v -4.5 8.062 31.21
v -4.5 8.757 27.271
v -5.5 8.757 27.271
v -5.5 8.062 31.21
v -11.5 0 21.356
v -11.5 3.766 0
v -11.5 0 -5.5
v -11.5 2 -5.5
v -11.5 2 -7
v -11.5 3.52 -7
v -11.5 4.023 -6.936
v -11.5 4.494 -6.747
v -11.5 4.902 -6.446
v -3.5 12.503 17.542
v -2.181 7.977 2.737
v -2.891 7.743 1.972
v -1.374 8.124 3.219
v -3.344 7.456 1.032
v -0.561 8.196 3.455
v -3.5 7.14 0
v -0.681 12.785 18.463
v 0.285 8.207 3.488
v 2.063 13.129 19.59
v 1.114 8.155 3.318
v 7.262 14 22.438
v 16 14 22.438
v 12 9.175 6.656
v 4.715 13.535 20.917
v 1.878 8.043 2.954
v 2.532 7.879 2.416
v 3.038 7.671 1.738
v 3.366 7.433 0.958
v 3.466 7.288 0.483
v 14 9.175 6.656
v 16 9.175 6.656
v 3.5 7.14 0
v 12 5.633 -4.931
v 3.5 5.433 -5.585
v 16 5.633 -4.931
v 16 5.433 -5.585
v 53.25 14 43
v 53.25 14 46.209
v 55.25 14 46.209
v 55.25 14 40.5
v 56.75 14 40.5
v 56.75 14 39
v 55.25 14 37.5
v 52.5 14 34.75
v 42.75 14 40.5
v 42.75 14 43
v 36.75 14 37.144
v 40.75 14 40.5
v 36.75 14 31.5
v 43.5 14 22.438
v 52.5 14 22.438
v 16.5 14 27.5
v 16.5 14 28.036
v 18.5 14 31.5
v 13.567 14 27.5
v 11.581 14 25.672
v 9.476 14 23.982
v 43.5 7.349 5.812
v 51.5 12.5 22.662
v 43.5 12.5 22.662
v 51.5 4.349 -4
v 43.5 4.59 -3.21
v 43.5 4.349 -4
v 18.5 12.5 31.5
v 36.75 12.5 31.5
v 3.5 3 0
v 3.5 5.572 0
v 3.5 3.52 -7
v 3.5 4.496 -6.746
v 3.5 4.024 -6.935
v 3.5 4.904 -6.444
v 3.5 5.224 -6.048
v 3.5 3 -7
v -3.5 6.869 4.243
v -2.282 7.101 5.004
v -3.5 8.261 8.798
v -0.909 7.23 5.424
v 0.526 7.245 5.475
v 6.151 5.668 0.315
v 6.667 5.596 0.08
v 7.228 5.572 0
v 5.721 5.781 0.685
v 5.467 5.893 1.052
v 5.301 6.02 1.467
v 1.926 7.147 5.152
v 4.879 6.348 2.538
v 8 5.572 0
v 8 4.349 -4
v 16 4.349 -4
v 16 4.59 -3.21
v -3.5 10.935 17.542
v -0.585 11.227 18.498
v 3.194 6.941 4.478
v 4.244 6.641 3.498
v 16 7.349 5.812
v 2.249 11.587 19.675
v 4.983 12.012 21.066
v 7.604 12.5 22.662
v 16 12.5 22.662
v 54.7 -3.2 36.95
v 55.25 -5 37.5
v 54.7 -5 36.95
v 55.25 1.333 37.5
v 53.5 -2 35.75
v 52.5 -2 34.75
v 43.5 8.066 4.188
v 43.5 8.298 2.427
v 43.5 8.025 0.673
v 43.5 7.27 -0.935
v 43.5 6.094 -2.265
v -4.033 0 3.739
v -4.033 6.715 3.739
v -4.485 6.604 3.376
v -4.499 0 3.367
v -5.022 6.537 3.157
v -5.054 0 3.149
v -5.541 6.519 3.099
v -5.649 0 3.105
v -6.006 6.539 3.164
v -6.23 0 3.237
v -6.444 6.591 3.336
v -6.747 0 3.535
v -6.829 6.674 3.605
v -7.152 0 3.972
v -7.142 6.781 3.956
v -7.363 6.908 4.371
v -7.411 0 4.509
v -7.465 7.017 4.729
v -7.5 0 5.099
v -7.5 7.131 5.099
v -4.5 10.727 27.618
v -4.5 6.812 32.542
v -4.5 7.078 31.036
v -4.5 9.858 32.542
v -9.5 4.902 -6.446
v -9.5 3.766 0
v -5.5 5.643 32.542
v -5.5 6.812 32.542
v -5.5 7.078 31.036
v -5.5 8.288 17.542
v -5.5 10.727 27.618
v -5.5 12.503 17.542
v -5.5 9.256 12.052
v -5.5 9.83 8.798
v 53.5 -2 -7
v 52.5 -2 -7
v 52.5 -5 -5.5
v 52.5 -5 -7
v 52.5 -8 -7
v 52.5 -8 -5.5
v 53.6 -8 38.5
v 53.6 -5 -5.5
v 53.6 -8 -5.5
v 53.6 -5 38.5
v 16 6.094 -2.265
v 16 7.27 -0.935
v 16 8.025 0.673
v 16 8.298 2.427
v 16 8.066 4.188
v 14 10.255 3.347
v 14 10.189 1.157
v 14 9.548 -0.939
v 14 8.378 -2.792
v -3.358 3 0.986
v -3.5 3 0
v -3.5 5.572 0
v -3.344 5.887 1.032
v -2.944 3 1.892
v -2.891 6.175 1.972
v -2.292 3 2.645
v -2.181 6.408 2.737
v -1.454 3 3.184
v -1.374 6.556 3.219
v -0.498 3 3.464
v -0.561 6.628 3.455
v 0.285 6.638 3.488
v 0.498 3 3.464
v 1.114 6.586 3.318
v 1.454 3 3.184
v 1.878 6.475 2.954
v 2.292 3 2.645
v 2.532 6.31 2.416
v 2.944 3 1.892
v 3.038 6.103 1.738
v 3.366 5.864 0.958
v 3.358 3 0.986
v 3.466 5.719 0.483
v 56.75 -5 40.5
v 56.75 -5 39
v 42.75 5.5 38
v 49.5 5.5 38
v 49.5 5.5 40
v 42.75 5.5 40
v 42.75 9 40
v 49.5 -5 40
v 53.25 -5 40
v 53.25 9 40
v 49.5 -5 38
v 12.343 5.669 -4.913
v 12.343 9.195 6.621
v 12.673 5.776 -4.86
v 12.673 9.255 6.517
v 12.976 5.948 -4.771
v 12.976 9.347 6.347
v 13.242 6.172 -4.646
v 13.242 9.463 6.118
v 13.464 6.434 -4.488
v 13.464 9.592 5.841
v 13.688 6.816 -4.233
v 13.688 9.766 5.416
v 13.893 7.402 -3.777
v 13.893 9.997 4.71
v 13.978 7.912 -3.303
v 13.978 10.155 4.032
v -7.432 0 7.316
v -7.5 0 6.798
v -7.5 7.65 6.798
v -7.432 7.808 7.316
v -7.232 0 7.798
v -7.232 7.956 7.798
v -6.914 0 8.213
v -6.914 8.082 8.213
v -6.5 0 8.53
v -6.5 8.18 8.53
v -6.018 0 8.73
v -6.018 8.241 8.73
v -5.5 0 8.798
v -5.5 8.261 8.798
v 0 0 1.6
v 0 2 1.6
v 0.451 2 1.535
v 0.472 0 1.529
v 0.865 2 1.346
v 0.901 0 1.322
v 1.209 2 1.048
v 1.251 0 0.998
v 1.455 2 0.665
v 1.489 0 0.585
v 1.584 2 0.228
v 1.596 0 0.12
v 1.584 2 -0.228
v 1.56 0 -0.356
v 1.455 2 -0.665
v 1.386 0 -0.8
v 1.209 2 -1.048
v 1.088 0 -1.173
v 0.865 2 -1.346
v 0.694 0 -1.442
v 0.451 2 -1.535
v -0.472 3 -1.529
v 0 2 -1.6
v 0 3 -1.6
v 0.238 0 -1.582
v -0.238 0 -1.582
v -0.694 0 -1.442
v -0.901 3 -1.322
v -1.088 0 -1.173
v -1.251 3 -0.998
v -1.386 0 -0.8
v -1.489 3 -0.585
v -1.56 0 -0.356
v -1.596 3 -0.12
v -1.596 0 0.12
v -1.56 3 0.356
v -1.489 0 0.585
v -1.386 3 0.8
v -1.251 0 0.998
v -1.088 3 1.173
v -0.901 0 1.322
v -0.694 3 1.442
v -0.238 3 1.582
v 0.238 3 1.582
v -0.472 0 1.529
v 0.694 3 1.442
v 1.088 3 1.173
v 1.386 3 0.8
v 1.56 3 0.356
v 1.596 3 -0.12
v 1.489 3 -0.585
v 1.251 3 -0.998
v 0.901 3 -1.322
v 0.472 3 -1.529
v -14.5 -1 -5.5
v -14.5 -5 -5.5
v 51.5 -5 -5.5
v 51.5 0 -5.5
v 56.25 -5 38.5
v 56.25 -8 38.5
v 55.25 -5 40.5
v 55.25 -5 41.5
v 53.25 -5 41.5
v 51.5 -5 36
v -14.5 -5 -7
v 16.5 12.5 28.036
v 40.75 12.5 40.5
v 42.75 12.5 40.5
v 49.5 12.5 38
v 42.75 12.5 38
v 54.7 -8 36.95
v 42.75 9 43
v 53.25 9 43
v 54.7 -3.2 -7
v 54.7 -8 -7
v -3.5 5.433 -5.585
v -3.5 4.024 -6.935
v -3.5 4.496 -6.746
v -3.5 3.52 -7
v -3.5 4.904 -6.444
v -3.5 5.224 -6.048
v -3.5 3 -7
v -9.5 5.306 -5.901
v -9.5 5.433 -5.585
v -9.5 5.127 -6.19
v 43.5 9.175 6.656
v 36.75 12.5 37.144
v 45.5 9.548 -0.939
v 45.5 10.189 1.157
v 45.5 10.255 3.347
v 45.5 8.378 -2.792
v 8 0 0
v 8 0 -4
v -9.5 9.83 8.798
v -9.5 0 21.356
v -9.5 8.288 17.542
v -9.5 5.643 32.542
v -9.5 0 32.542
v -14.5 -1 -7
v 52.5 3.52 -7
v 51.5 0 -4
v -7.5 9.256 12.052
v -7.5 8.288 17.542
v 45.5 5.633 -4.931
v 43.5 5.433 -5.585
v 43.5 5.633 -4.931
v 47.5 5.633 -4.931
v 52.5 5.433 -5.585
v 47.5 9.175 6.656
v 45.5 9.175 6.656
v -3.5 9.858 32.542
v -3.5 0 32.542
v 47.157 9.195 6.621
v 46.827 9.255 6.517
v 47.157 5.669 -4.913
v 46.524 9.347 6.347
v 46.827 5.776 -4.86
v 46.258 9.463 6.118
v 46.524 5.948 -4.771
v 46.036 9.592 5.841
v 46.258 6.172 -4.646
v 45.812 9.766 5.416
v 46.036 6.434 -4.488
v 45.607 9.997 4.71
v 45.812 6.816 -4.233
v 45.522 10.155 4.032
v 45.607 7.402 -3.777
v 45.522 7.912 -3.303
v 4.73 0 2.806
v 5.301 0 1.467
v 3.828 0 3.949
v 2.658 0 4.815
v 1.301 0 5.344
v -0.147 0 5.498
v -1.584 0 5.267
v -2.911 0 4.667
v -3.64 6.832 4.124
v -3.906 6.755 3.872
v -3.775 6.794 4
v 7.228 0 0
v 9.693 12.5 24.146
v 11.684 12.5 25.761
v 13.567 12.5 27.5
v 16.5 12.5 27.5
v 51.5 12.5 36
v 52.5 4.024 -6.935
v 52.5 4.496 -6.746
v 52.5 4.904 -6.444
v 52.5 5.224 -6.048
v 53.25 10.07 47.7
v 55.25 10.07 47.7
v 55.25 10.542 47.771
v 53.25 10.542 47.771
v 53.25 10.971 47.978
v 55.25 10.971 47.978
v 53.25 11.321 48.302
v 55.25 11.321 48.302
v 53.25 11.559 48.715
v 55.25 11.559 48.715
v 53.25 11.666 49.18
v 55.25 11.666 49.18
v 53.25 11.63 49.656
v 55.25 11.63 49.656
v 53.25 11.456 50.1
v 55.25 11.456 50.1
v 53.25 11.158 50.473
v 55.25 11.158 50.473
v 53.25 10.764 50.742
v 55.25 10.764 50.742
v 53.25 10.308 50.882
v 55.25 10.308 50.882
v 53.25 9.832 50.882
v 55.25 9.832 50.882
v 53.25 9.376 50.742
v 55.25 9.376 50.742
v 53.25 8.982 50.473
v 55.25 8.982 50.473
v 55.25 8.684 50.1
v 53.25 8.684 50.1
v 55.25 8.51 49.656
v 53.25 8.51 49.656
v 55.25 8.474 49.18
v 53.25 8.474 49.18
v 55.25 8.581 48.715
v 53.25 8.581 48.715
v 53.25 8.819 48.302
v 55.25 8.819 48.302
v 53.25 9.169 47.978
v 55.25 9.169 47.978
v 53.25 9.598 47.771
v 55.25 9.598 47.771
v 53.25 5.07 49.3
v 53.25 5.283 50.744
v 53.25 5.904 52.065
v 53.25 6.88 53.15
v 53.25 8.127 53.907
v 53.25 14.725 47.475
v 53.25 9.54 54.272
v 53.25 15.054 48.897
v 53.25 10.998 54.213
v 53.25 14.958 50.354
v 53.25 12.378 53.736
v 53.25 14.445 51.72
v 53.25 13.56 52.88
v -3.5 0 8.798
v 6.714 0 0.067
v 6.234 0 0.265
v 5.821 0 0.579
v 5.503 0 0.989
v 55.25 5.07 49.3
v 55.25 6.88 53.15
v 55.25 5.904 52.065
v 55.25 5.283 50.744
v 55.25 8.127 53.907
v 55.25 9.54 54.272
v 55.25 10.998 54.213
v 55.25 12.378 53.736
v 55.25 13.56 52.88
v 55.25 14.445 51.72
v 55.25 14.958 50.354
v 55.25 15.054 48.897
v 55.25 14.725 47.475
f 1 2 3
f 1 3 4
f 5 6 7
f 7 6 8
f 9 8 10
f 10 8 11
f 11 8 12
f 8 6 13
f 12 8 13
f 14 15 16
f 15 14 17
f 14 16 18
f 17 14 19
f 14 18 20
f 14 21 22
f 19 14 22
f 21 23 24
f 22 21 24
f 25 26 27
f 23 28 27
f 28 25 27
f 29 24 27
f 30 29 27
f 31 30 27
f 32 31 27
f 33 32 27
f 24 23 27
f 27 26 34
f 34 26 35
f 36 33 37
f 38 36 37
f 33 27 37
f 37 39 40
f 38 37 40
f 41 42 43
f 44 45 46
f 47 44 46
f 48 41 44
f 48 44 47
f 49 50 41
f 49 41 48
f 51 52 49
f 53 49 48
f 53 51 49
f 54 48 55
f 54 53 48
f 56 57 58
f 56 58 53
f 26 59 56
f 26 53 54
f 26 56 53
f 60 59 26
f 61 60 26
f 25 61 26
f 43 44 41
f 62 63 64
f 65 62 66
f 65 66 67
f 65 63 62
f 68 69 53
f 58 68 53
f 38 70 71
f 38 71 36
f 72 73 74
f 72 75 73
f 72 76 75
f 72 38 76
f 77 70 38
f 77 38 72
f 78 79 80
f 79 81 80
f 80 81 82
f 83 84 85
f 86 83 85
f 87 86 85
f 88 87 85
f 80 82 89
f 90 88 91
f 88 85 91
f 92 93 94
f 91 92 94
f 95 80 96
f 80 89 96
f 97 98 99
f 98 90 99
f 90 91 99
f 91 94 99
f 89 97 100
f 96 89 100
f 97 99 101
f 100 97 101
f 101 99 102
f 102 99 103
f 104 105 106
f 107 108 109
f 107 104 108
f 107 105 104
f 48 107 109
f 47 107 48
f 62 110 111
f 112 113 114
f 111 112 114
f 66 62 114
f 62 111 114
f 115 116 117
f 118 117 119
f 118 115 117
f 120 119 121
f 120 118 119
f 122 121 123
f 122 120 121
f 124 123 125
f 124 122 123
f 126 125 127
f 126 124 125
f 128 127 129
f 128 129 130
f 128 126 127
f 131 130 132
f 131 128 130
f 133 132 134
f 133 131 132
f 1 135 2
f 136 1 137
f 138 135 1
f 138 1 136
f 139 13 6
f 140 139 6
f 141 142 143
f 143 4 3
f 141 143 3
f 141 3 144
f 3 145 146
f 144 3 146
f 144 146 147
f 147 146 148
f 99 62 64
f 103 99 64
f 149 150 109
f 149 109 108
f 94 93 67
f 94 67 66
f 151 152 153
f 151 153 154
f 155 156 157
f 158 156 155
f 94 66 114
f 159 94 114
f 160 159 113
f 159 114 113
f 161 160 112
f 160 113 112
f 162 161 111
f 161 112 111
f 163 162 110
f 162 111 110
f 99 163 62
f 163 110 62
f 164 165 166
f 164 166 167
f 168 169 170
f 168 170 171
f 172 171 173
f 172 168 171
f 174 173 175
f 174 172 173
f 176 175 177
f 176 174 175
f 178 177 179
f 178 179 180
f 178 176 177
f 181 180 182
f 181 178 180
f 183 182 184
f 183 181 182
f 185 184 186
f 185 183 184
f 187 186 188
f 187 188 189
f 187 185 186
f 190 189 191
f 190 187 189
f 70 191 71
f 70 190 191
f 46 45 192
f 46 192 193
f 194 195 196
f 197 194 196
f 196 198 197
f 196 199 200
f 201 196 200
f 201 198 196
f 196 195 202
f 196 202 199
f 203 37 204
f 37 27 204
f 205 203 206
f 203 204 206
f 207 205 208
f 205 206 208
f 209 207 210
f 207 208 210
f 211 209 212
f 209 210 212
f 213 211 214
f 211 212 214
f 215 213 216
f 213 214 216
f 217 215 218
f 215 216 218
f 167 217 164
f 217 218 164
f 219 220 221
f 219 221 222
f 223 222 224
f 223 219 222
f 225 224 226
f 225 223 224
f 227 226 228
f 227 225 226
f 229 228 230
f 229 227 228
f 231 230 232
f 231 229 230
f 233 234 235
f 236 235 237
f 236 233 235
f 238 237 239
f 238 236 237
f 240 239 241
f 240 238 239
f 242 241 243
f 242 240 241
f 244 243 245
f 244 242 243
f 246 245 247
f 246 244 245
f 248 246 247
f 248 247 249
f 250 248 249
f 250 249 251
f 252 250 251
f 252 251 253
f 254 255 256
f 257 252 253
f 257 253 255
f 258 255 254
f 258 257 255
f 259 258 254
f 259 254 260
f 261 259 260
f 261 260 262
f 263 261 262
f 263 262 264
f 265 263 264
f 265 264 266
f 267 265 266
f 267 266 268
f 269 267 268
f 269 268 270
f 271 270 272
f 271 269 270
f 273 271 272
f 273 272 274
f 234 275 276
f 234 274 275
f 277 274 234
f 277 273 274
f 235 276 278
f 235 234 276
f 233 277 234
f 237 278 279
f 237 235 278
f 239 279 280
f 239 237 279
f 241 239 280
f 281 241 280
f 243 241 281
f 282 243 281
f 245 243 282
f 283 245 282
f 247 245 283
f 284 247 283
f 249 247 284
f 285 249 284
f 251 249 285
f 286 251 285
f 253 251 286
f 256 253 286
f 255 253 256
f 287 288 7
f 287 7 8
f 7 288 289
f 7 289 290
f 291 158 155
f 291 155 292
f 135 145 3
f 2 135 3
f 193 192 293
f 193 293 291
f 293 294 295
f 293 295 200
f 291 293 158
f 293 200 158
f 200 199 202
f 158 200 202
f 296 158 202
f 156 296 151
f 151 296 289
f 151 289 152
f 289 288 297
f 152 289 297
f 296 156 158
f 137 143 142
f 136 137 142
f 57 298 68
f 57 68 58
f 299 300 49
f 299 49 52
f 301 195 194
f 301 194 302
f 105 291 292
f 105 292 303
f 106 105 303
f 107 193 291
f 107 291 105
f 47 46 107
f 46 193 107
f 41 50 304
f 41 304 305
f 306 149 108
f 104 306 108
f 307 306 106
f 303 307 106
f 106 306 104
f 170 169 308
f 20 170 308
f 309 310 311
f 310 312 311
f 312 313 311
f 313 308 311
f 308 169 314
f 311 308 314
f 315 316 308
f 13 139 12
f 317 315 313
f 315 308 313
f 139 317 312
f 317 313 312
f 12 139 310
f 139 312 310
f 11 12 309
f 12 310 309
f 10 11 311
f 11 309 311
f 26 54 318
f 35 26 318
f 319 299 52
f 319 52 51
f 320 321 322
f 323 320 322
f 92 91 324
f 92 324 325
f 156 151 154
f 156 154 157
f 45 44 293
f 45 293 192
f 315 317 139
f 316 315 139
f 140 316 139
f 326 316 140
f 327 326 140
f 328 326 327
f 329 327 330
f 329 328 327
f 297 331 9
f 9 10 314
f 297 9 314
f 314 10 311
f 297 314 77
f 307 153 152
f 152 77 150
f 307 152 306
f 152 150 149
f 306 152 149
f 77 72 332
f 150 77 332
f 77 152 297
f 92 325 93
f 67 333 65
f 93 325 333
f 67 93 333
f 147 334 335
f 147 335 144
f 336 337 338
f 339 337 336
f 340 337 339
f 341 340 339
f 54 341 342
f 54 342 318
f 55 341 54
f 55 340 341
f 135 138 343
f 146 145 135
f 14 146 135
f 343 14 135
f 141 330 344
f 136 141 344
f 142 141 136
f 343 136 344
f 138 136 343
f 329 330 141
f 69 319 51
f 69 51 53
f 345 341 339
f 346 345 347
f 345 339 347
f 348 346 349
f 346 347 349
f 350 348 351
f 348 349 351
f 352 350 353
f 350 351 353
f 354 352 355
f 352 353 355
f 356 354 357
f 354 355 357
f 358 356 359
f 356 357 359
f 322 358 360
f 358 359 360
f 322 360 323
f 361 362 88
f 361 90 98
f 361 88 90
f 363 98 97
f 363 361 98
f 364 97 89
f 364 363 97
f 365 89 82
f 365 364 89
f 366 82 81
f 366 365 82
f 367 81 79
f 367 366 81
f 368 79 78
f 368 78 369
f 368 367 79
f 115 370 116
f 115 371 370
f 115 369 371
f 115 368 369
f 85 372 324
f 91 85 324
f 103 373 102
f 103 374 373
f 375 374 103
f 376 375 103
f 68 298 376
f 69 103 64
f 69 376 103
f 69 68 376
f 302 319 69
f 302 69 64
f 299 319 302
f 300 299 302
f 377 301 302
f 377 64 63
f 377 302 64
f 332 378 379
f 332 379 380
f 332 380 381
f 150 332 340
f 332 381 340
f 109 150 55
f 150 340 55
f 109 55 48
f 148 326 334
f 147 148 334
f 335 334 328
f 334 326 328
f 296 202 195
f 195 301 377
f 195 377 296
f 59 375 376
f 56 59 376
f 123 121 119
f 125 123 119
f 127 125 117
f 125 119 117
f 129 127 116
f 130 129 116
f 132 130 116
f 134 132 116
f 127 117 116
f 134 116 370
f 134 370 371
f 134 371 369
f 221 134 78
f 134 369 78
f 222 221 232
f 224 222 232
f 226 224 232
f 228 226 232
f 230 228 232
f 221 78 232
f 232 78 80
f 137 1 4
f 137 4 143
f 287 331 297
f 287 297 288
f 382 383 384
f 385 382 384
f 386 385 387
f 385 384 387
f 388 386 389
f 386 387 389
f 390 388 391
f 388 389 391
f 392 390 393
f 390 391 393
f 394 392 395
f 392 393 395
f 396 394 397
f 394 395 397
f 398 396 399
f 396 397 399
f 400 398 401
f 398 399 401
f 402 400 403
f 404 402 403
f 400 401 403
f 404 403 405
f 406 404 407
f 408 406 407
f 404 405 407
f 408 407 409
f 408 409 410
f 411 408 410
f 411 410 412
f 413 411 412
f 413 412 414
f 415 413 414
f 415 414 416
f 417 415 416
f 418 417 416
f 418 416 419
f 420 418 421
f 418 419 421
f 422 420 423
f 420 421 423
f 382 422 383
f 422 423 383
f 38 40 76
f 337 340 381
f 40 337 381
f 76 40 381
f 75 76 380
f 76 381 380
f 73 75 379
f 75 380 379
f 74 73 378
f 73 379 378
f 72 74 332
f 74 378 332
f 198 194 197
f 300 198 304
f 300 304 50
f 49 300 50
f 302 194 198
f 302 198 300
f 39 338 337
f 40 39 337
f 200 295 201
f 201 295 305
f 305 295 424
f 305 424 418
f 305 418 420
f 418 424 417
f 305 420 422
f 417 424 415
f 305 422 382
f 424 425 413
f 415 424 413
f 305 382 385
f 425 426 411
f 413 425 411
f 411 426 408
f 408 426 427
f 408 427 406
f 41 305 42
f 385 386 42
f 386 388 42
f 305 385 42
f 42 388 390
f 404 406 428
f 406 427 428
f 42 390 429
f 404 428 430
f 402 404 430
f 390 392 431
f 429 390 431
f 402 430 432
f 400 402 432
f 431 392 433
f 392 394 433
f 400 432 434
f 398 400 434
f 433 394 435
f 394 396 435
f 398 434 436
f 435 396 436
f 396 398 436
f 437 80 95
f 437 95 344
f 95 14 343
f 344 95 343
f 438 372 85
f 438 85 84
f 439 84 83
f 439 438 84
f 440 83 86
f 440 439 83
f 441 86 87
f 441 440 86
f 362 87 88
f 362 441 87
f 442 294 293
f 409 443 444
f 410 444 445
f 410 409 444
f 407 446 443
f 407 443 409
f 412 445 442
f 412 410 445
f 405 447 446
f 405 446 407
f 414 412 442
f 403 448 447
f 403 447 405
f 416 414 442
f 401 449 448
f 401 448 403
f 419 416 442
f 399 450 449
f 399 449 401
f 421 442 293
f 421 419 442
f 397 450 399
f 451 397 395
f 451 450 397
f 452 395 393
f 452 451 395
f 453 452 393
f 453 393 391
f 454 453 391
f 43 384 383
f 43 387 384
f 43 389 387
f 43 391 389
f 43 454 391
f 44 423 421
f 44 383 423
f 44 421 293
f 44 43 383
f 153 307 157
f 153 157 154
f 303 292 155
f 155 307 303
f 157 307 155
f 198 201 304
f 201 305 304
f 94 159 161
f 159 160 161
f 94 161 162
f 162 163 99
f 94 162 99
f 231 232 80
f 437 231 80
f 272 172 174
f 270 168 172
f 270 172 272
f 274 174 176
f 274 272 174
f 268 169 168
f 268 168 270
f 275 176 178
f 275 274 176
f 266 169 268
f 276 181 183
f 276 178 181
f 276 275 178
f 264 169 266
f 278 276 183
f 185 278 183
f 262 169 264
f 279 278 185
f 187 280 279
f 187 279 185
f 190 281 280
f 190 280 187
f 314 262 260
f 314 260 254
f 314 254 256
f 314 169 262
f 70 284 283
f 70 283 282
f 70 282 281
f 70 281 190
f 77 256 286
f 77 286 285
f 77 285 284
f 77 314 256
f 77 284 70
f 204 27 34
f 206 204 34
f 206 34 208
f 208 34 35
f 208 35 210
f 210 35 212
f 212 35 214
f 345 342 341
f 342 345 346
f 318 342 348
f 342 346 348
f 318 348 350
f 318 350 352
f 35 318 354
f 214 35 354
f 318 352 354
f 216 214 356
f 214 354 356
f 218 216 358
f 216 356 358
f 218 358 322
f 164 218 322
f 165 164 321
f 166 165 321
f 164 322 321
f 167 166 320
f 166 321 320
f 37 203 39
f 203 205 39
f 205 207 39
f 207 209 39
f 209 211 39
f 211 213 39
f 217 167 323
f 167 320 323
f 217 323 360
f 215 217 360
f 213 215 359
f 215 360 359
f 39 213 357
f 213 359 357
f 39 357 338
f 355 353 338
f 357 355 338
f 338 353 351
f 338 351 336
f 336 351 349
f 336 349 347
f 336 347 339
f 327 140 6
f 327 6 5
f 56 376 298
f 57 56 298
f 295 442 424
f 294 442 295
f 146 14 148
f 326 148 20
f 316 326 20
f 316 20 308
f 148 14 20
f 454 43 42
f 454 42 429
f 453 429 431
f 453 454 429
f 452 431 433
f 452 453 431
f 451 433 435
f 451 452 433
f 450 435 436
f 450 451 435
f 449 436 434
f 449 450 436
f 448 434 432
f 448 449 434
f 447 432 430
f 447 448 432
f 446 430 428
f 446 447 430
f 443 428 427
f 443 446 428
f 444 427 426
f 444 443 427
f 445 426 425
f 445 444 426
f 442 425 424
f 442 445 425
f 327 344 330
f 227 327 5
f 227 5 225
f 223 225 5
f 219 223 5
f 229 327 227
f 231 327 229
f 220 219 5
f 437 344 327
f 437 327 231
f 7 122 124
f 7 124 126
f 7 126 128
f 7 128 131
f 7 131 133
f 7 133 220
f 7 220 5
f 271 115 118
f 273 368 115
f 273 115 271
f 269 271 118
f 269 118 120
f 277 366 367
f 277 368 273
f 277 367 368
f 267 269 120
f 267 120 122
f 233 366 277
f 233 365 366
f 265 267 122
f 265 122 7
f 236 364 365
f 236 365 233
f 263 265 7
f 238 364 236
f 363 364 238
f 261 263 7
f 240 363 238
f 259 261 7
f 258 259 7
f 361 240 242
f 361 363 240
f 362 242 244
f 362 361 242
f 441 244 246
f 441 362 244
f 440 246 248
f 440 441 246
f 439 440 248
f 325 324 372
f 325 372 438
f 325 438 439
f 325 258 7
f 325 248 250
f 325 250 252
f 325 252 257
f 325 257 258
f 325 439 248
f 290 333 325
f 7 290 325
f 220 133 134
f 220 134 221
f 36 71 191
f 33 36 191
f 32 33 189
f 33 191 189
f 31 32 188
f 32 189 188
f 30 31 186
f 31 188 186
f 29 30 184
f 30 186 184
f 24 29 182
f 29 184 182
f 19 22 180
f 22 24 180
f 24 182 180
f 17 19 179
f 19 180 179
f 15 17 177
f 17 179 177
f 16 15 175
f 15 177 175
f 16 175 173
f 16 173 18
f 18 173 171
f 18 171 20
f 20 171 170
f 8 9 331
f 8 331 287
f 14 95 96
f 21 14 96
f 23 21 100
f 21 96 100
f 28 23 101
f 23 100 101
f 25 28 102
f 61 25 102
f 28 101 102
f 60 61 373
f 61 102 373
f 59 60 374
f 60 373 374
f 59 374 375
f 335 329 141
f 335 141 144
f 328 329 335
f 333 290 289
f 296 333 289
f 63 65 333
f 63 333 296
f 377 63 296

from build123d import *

# Parameters (mm, degrees)
SKETCH_1_R                      = 3.5
SKETCH_1_R_2                    = 1.6
EXTRUDE_1_DEPTH                 = 2
EXTRUDE_2_DEPTH                 = 2
SKETCH_3_W                      = 7
SKETCH_3_H                      = 1.5
EXTRUDE_3_DEPTH                 = 5
EXTRUDE_4_DEPTH                 = 49
CUT_EXTRUDE_1_REACH             = 55.2
SKETCH_5_W                      = 44.5
SKETCH_5_H                      = 4
SKETCH_6_W                      = 1
SKETCH_6_H                      = 7
EXTRUDE_5_DEPTH                 = 47
EXTRUDE_6_DEPTH                 = 1
EXTRUDE_7_DEPTH                 = 8
EXTRUDE_8_DEPTH                 = 27.5
EXTRUDE_START                   = 2
EXTRUDE_9_DEPTH                 = 2
CUT_EXTRUDE_2_REACH             = 71.172
SKETCH_11_W                     = 26.75
SKETCH_11_H                     = 10
EXTRUDE_10_DEPTH                = 19.5
EXTRUDE_11_DEPTH                = 2
EXTRUDE_12_REACH                = 69.989
CUT_EXTRUDE_3_REACH             = 69.989
SKETCH_15_R                     = 1.6
CUT_EXTRUDE_4_REACH             = 71.172
SKETCH_16_W                     = 20
SKETCH_16_H                     = 4
CUT_EXTRUDE_5_REACH             = 71.172
CUT_EXTRUDE_5_DIRECTION_2_REACH = 71.172
CHAMFER_1_SIZE                  = 2
CHAMFER_1_SIZE2                 = 3.464101615
EXTRUDE_13_DEPTH                = 1.5
SKETCH_19_W                     = 3.5
SKETCH_19_H                     = 17.5
EXTRUDE_14_DEPTH                = 2
SKETCH_20_W                     = 3.5
SKETCH_20_H                     = 7
EXTRUDE_15_DEPTH                = 6.75
EXTRUDE_16_DEPTH                = 8
SKETCH_22_W                     = 1.5
SKETCH_22_H                     = 4
EXTRUDE_17_DEPTH                = 3
CHAMFER_2_SIZE                  = 3
CUT_EXTRUDE_6_DEPTH             = 5.5
CUT_EXTRUDE_7_DEPTH             = 2
EXTRUDE_18_DEPTH                = 2
CUT_EXTRUDE_8_DEPTH             = 4
EXTRUDE_19_REACH                = 70.736
SKETCH_27_W                     = 6
SKETCH_27_H                     = 8.878803279
EXTRUDE_20_DEPTH                = 2
EXTRUDE_21_DEPTH                = 6
SKETCH_31_W                     = 2
SKETCH_31_H                     = 6.859975599
EXTRUDE_22_DEPTH                = 15.231399178
CUT_EXTRUDE_9_DEPTH             = 1
EXTRUDE_23_DEPTH                = 1
CUT_EXTRUDE_10_REACH            = 69.82
SKETCH_35_R                     = 3.5
EXTRUDE_24_REACH                = 70.37
EXTRUDE_25_REACH                = 70.37
SKETCH_38_W                     = 4
SKETCH_38_H                     = 19
EXTRUDE_26_DEPTH                = 2.75
SKETCH_39_R                     = 1.6
EXTRUDE_27_DEPTH                = 2
SKETCH_40_W                     = 10.5
SKETCH_40_H                     = 5
EXTRUDE_28_DEPTH                = 1.5
CHAMFER_3_SIZE                  = 2.75
CUT_EXTRUDE_11_REACH            = 80.401
SKETCH_41_W                     = 7
SKETCH_41_H                     = 7
FILLET_2_R                      = 2
EXTRUDE_START_2                 = -17.5
EXTRUDE_29_DEPTH                = 17.5
SKETCH_43_W                     = 3
SKETCH_43_H                     = 19
EXTRUDE_30_DEPTH                = 1.5
CHAMFER_4_SIZE                  = 1.5
EXTRUDE_31_DEPTH                = 2
FILLET_3_R                      = 2
CUT_EXTRUDE_12_DEPTH            = 1.5
EXTRUDE_32_DEPTH                = 3
EXTRUDE_32_DEPTH_BACK           = 3
SKETCH_47_W                     = 2.2
SKETCH_47_H                     = 43.95
CHAMFER_5_SIZE                  = 1.2
SKETCH_48_W                     = 1.1
SKETCH_48_H                     = 42.45
CUT_EXTRUDE_13_DEPTH            = 3
EXTRUDE_33_DEPTH                = 3
SKETCH_50_W                     = 1.6
SKETCH_50_H                     = 2
CUT_EXTRUDE_14_DEPTH            = 3
EXTRUDE_34_DEPTH                = 3


# Some blends are built 0.0001 mm under size
with BuildPart() as part:
    # 草图1 → 凸台-拉伸1 (new body)
    with BuildSketch(Plane(origin=(0, 0, 0), x_dir=(1, 0, 0), z_dir=(0, 1, 0))):
        with Locations(Location((0, 0, 0), (0, 0, 270))):
            Circle(SKETCH_1_R)
        with Locations(Location((0, 0, 0), (0, 0, 270))):
            Circle(SKETCH_1_R_2, mode=Mode.SUBTRACT)
    extrude(amount=EXTRUDE_1_DEPTH)

    # 草图2 → 凸台-拉伸2 (add)
    with BuildSketch(Plane.XZ):
        with BuildLine():
            Line((-3.5, 0), (-3.5, -7))
            Line((-3.5, -7), (3.5, -7))
            Line((3.5, -7), (3.5, 0))
            ThreePointArc((3.5, 0), (0, -3.5), (-3.5, 0))
        make_face()
    extrude(amount=-EXTRUDE_2_DEPTH)

    # 草图3 → 凸台-拉伸3 (add)
    with BuildSketch(Plane.XZ):
        with Locations((0, -6.25)):
            Rectangle(SKETCH_3_W, SKETCH_3_H)
    extrude(amount=EXTRUDE_3_DEPTH)

    # 草图4 → 凸台-拉伸4 (add)
    with BuildSketch(Plane(origin=(3.5, 0, 0), x_dir=(0, 0, -1), z_dir=(1, 0, 0))):
        Polygon((0, 0), (5.5, 0), (5.5, -5), (7, -5), (7, 2), (0, 2), align=None)
    extrude(amount=EXTRUDE_4_DEPTH)

    # 草图5 → 切除-拉伸1 (cut, up to next)
    with BuildSketch(Plane.XZ, mode=Mode.PRIVATE) as cut_extrude_1_sk1:
        with Locations((30.25, -2)):
            Rectangle(SKETCH_5_W, SKETCH_5_H)
    cut_extrude_1_tool1 = extrude(cut_extrude_1_sk1.sketch, amount=-CUT_EXTRUDE_1_REACH, mode=Mode.PRIVATE) & part.part
    add(cut_extrude_1_tool1.solids().sort_by_distance((30.25, 0, -2))[0], mode=Mode.SUBTRACT)

    # 草图6 → 凸台-拉伸5 (add)
    with BuildSketch(Plane.XY.offset(-5.5)):
        with Locations((52, -1.5)):
            Rectangle(SKETCH_6_W, SKETCH_6_H)
    extrude(amount=EXTRUDE_5_DEPTH)

    # 草图7 → 凸台-拉伸6 (add)
    with BuildSketch(Plane(origin=(52.5, 0, 0), x_dir=(0, 0, -1), z_dir=(1, 0, 0))):
        Polygon((-22.437673566, 14), (7, 5), (7, 2), (-41.5, 2), (-41.5, 14), align=None)
    extrude(amount=-EXTRUDE_6_DEPTH)

    # 草图8 → 凸台-拉伸7 (add)
    with BuildSketch(Plane.ZY.offset(-51.5)):
        Polygon((-7, 2), (-7, 5), (22.437673566, 14), (41.5, 14), (41.5, 12.5), (22.661850068, 12.5), (-4, 4.34865441), (-4, 2), align=None)
    extrude(amount=EXTRUDE_7_DEPTH)

    # 草图9 → 凸台-拉伸8 (add)
    with BuildSketch(Plane.ZY.offset(-43.5)):
        with BuildLine():
            Line((5.812409936, 7.348609186), (22.661850068, 12.5))
            Line((22.661850068, 12.5), (41.5, 12.5))
            Line((41.5, 12.5), (41.5, 14))
            Line((41.5, 14), (22.437673566, 14))
            Line((22.437673566, 14), (6.656260181, 9.175137731))
            ThreePointArc((6.656260181, 9.175137731), (0.087933436, 9.938081874), (-4.930823274, 5.63261081))
            Line((-4.930823274, 5.63261081), (-7, 5))
            Line((-7, 5), (-7, 2))
            Line((-7, 2), (-4, 2))
            Line((-4, 2), (-4, 4.34865441))
            Line((-4, 4.34865441), (-3.209857915, 4.590225088))
            ThreePointArc((-3.209857915, 4.590225088), (0.672676845, 8.025472362), (5.812409936, 7.348609186))
        make_face()
    extrude(amount=EXTRUDE_8_DEPTH)

    # 草图10 → 凸台-拉伸9 (add)
    with BuildSketch(Plane(origin=(43.5, 0, 0), x_dir=(0, 0, -1), z_dir=(1, 0, 0)).offset(EXTRUDE_START)):
        with BuildLine():
            Line((-6.656260181, 9.175137731), (4.930823274, 5.63261081))
            ThreePointArc((4.930823274, 5.63261081), (-0.087933436, 9.938081874), (-6.656260181, 9.175137731))
        make_face()
    extrude(amount=-EXTRUDE_9_DEPTH)

    # 草图11 → 切除-拉伸2 (cut, up to next)
    with BuildSketch(Plane.XZ.offset(-12.5), mode=Mode.PRIVATE) as cut_extrude_2_sk1:
        with Locations((29.375, 36.5)):
            Rectangle(SKETCH_11_W, SKETCH_11_H)
    cut_extrude_2_tool1 = extrude(cut_extrude_2_sk1.sketch, amount=-CUT_EXTRUDE_2_REACH, mode=Mode.PRIVATE) & part.part
    add(cut_extrude_2_tool1.solids().sort_by_distance((29.375, 12.5, 36.5))[0], mode=Mode.SUBTRACT)

    # 草图12 → 凸台-拉伸10 (add)
    with BuildSketch(Plane.ZY.offset(-16)):
        Polygon((-7, 2), (-4, 2), (-4, 4.34865441), (22.661850068, 12.5), (31.5, 12.5), (31.5, 14), (22.437673566, 14), (-7, 5), align=None)
    extrude(amount=EXTRUDE_10_DEPTH)

    # 草图13 → 凸台-拉伸11 (add)
    with BuildSketch(Plane.ZY.offset(-16)):
        with BuildLine():
            Line((-4.930823274, 5.63261081), (6.656260181, 9.175137731))
            ThreePointArc((6.656260181, 9.175137731), (0.087933436, 9.938081874), (-4.930823274, 5.63261081))
        make_face()
    extrude(amount=EXTRUDE_11_DEPTH)

    # 凸台-拉伸12: up to this plane
    extrude_12_end = Plane(origin=(43.5, 12.5, 22.661850068), z_dir=(0, 0.9563047559630374, -0.29237170472273066))
    # 草图14 → 凸台-拉伸12 (add, up to the surface)
    with BuildSketch(Plane(origin=(0, 2, 0), x_dir=(1, 0, 0), z_dir=(0, 1, 0)), mode=Mode.PRIVATE) as extrude_12_sk1:
        with BuildLine():
            Line((8, 0), (8, 4))
            Line((8, 4), (-3.5, 4))
            Line((-3.5, 4), (-3.5, 0))
            ThreePointArc((-3.5, 0), (0, -3.5), (3.5, 0))
            Line((3.5, 0), (8, 0))
        make_face()
    extrude_12_tool1 = split(extrude(extrude_12_sk1.sketch, amount=EXTRUDE_12_REACH, mode=Mode.PRIVATE), bisect_by=extrude_12_end, keep=Keep.BOTH, mode=Mode.PRIVATE)
    add(extrude_12_tool1.solids().sort_by_distance((1.586395, 2, -0.972018))[0])

    # 草图15 → 切除-拉伸3 (cut, up to next)
    with BuildSketch(Plane.XZ.offset(-2), mode=Mode.PRIVATE) as cut_extrude_3_sk1:
        with Locations(Location((0, 0, 0), (0, 0, 270))):
            Circle(SKETCH_15_R)
    cut_extrude_3_tool1 = extrude(cut_extrude_3_sk1.sketch, amount=-CUT_EXTRUDE_3_REACH, mode=Mode.PRIVATE) & part.part
    add(cut_extrude_3_tool1.solids().sort_by_distance((0, 2, 0))[0], mode=Mode.SUBTRACT)

    # 草图16 → 切除-拉伸4 (cut, up to next)
    with BuildSketch(Plane.XZ.offset(-12.5), mode=Mode.PRIVATE) as cut_extrude_4_sk1:
        with Locations((6.5, 29.5)):
            Rectangle(SKETCH_16_W, SKETCH_16_H)
    cut_extrude_4_tool1 = extrude(cut_extrude_4_sk1.sketch, amount=-CUT_EXTRUDE_4_REACH, mode=Mode.PRIVATE) & part.part
    add(cut_extrude_4_tool1.solids().sort_by_distance((6.5, 12.5, 29.5))[0], mode=Mode.SUBTRACT)

    # 草图17 → 切除-拉伸5 (cut, up to next)
    with BuildSketch(Plane.XZ.offset(-12.5), mode=Mode.PRIVATE) as cut_extrude_5_sk1:
        with BuildLine():
            Line((13.566884401, 27.5), (-3.5, 27.5))
            Line((-3.5, 27.5), (-3.5, 17.542230954))
            ThreePointArc((-3.5, 17.542230954), (5.657992343, 21.450682428), (13.566884401, 27.5))
        make_face()
    cut_extrude_5_tool1 = extrude(cut_extrude_5_sk1.sketch, amount=-CUT_EXTRUDE_5_REACH, mode=Mode.PRIVATE) & part.part
    add(cut_extrude_5_tool1.solids().sort_by_distance((2.689005, 12.5, 23.843296))[0], mode=Mode.SUBTRACT)

    # 草图17 → 切除-拉伸5 direction 2 (cut, up to next)
    with BuildSketch(Plane.XZ.offset(-12.5), mode=Mode.PRIVATE) as cut_extrude_5_direction_2_sk1:
        with BuildLine():
            Line((13.566884401, 27.5), (-3.5, 27.5))
            Line((-3.5, 27.5), (-3.5, 17.542230954))
            ThreePointArc((-3.5, 17.542230954), (5.657992343, 21.450682428), (13.566884401, 27.5))
        make_face()
    cut_extrude_5_direction_2_tool1 = extrude(cut_extrude_5_direction_2_sk1.sketch, amount=CUT_EXTRUDE_5_DIRECTION_2_REACH, mode=Mode.PRIVATE) & part.part
    add(cut_extrude_5_direction_2_tool1.solids().sort_by_distance((2.689005, 12.5, 23.843296))[0], mode=Mode.SUBTRACT)

    # 倒角1
    chamfer_1_edges = [part.edges().sort_by_distance(p)[0] for p in [
        (16.5, 13.25, 31.5),
    ]]
    chamfer_1_side = [part.faces().sort_by_distance(p)[0] for p in [
        (29.625, 13.25, 31.5),
    ]]
    chamfer(chamfer_1_edges, length=CHAMFER_1_SIZE, length2=CHAMFER_1_SIZE2, reference=chamfer_1_side[0])

    # 草图18 → 凸台-拉伸13 (add)
    with BuildSketch(Plane.XZ.offset(-12.5)):
        Polygon((42.75, 40.5), (40.75, 40.5), (36.75, 37.143601475), (36.75, 31.5), (42.75, 31.5), align=None)
    extrude(amount=-EXTRUDE_13_DEPTH)

    # 草图19 → 凸台-拉伸14 (add)
    with BuildSketch(Plane.ZY.offset(-51.5)):
        with Locations((39.75, 3.75)):
            Rectangle(SKETCH_19_W, SKETCH_19_H)
    extrude(amount=EXTRUDE_14_DEPTH)

    # 草图20 → 凸台-拉伸15 (add)
    with BuildSketch(Plane.ZY.offset(-49.5)):
        with Locations((39.75, 9)):
            Rectangle(SKETCH_20_W, SKETCH_20_H)
    extrude(amount=EXTRUDE_15_DEPTH)

    # 草图21 → 凸台-拉伸16 (add)
    with BuildSketch(Plane.ZY.offset(3.5)):
        Polygon((0, 5.571577135), (17.542230954, 10.934775359), (17.542230954, 12.503312994), (-7, 5), (-7, -5), (-5.5, -5), (-5.5, 0), (0, 0), align=None)
    extrude(amount=EXTRUDE_16_DEPTH)

    # 草图22 → 凸台-拉伸17 (add)
    with BuildSketch(Plane.ZY.offset(11.5)):
        with Locations((-6.25, -3)):
            Rectangle(SKETCH_22_W, SKETCH_22_H)
    extrude(amount=EXTRUDE_17_DEPTH)

    # 倒角2
    chamfer_2_edges = [part.edges().sort_by_distance(p)[0] for p in [
        (-11.5, -1, -6.25),
    ]]
    chamfer(chamfer_2_edges, length=CHAMFER_2_SIZE - 0.0001)  # a hair under: the kernel refuses the full size

    # 草图23 → 切除-拉伸6 (cut)
    with BuildSketch(Plane.XY):
        Polygon((-11.5, 2), (-11.5, 0), (-13.5, 0), align=None)
    extrude(amount=-CUT_EXTRUDE_6_DEPTH, mode=Mode.SUBTRACT)

    # 草图24 → 切除-拉伸7 (cut)
    with BuildSketch(Plane.ZY.offset(11.5)):
        Polygon((-7, 5), (17.542230954, 0.672542516), (17.542230954, 12.503312994), align=None)
    extrude(amount=-CUT_EXTRUDE_7_DEPTH, mode=Mode.SUBTRACT)

    # 草图25 → 凸台-拉伸18 (add)
    with BuildSketch(Plane.ZY.offset(9.5)):
        Polygon((0, 5.571577135), (0, 0), (17.542230954, 0), (17.542230954, 10.934775359), align=None)
    extrude(amount=-EXTRUDE_18_DEPTH)

    # 草图26 → 切除-拉伸8 (cut)
    with BuildSketch(Plane.ZY.offset(9.5)):
        Polygon((8.798316647, 9.830030114), (17.542230954, 8.288242105), (17.542230954, 12.503312994), align=None)
    extrude(amount=-CUT_EXTRUDE_8_DEPTH, mode=Mode.SUBTRACT)

    # 凸台-拉伸19: up to this plane
    extrude_19_end = Plane(origin=(0, 0, 0), z_dir=(0, 1, 0))
    # 草图27 → 凸台-拉伸19 (add, up to the surface)
    with BuildSketch(Plane(origin=(0, 11.038219198, 1.946335864), x_dir=(1, 0, 0), z_dir=(0, 0.9848077530122081, 0.1736481776669299)), mode=Mode.PRIVATE) as extrude_19_sk1:
        with Locations((-6.5, -11.397085271)):
            Rectangle(SKETCH_27_W, SKETCH_27_H)
    extrude_19_tool1 = split(extrude(extrude_19_sk1.sketch, amount=EXTRUDE_19_REACH, dir=(0, -1, 0), mode=Mode.PRIVATE), bisect_by=extrude_19_end, keep=Keep.BOTH, mode=Mode.PRIVATE)
    add(extrude_19_tool1.solids().sort_by_distance((-6.5, 9.059136, 13.170274))[0])

    # 草图28 → 凸台-拉伸20 (add)
    with BuildSketch(Plane.ZY.offset(5.5)):
        Polygon((17.542230954, 12.503312994), (17.542230954, 8.288242105), (8.798316647, 9.830030114), align=None)
    extrude(amount=-EXTRUDE_20_DEPTH)

    # 草图30 → 凸台-拉伸21 (add)
    with BuildSketch(Plane.ZY.offset(9.5)):
        Polygon((17.542230954, 0), (32.542230954, 0), (32.542230954, 5.643337395), (17.542230954, 8.288242105), align=None)
    extrude(amount=-EXTRUDE_21_DEPTH)

    # 草图31 → 凸台-拉伸22 (add, along a direction that is not the sketch's normal)
    with BuildSketch(Plane.XY.offset(17.542230954)):
        with Locations((-4.5, 9.073325195)):
            Rectangle(SKETCH_31_W, SKETCH_31_H)
    extrude(amount=EXTRUDE_22_DEPTH, dir=(0, -0.17364817766692983, 0.9848077530122081))

    # 草图32 → 切除-拉伸9 (cut)
    with BuildSketch(Plane.ZY.offset(5.5)):
        Polygon((27.618192189, 10.726649172), (27.097247656, 7.772225913), (32.542230954, 6.812128448), (32.542230954, 9.858408283), align=None)
    extrude(amount=-CUT_EXTRUDE_9_DEPTH, mode=Mode.SUBTRACT)

    # 草图33 → 凸台-拉伸23 (add)
    with BuildSketch(Plane.ZY.offset(4.5)):
        Polygon((27.270895834, 8.757033666), (31.210126846, 8.062440955), (31.036478668, 7.077633202), (27.097247656, 7.772225913), align=None)
    extrude(amount=EXTRUDE_23_DEPTH)

    # 切除-拉伸10: up to this plane
    cut_extrude_10_end = Plane(origin=(1.537514073, 14, 22.437673566), z_dir=(0, 0.9563047559630374, -0.29237170472273044))
    # 草图35 → 切除-拉伸10 (cut, up to the surface)
    with BuildSketch(Plane(origin=(0, 3, 0), x_dir=(-1, 0, 0), z_dir=(0, -1, 0)), mode=Mode.PRIVATE) as cut_extrude_10_sk1:
        with Locations(Location((0, 0, 0), (0, 0, 90))):
            Circle(SKETCH_35_R)
    cut_extrude_10_tool1 = split(extrude(cut_extrude_10_sk1.sketch, amount=-CUT_EXTRUDE_10_REACH, mode=Mode.PRIVATE), bisect_by=cut_extrude_10_end, keep=Keep.BOTH, mode=Mode.PRIVATE)
    add(cut_extrude_10_tool1.solids().sort_by_distance((0, 3, 0))[0], mode=Mode.SUBTRACT)

    # 凸台-拉伸24: up to this plane
    extrude_24_end = Plane(origin=(43.5, 12.5, 22.661850068), z_dir=(0, 0.9563047559630374, -0.29237170472273066))
    # 草图36 → 凸台-拉伸24 (add, up to the surface)
    with BuildSketch(Plane.XZ, mode=Mode.PRIVATE) as extrude_24_sk1:
        with BuildLine():
            Line((-5.5, 0), (-3.5, 0))
            ThreePointArc((-3.5, 0), (0, 3.5), (3.5, 0))
            Line((3.5, 0), (5.5, 0))
            ThreePointArc((5.5, 0), (0, 5.5), (-5.5, 0))
        make_face()
    extrude_24_tool1 = split(extrude(extrude_24_sk1.sketch, amount=-EXTRUDE_24_REACH, mode=Mode.PRIVATE), bisect_by=extrude_24_end, keep=Keep.BOTH, mode=Mode.PRIVATE)
    add(extrude_24_tool1.solids().sort_by_distance((-4.5, 0, 0.122984))[0])

    # 凸台-拉伸25: up to this plane
    extrude_25_end = Plane(origin=(43.5, 12.5, 22.661850068), z_dir=(0, 0.9563047559630374, -0.29237170472273066))
    # 草图37 → 凸台-拉伸25 (add, up to the surface)
    with BuildSketch(Plane.XZ, mode=Mode.PRIVATE) as extrude_25_sk1:
        with BuildLine():
            Line((-7.5, 5.099019514), (-7.5, 0))
            Line((-7.5, 0), (-5.5, 0))
            ThreePointArc((-5.5, 0), (-5.120221349, 2.008316044), (-4.033333333, 3.739280977))
            ThreePointArc((-4.033333333, 3.739280977), (-6.230296743, 3.237120841), (-7.5, 5.099019514))
        make_face()
    extrude_25_tool1 = split(extrude(extrude_25_sk1.sketch, amount=-EXTRUDE_25_REACH, mode=Mode.PRIVATE), bisect_by=extrude_25_end, keep=Keep.BOTH, mode=Mode.PRIVATE)
    add(extrude_25_tool1.solids().sort_by_distance((-6.381558, 0, 1.877202))[0])
    # 草图37 → 凸台-拉伸25 (add, up to the surface)
    with BuildSketch(Plane.XZ, mode=Mode.PRIVATE) as extrude_25_sk2:
        with BuildLine():
            Line((-7.5, 8.798316647), (-7.5, 6.798316647))
            ThreePointArc((-7.5, 6.798316647), (-6.914213562, 8.21253021), (-5.5, 8.798316647))
            Line((-5.5, 8.798316647), (-7.5, 8.798316647))
        make_face()
    extrude_25_tool2 = split(extrude(extrude_25_sk2.sketch, amount=-EXTRUDE_25_REACH, mode=Mode.PRIVATE), bisect_by=extrude_25_end, keep=Keep.BOTH, mode=Mode.PRIVATE)
    add(extrude_25_tool2.solids().sort_by_distance((-7.053264, 0, 8.351581))[0])
    # 草图37 → 凸台-拉伸25 (add, up to the surface)
    with BuildSketch(Plane.XZ, mode=Mode.PRIVATE) as extrude_25_sk3:
        with BuildLine():
            ThreePointArc((7.228416147, 0), (6.017356006, 0.408355148), (5.300838508, 1.466666667))
            ThreePointArc((5.300838508, 1.466666667), (5.449982192, 0.74006358), (5.5, 0))
            Line((5.5, 0), (7.228416147, 0))
        make_face()
    extrude_25_tool3 = split(extrude(extrude_25_sk3.sketch, amount=-EXTRUDE_25_REACH, mode=Mode.PRIVATE), bisect_by=extrude_25_end, keep=Keep.BOTH, mode=Mode.PRIVATE)
    add(extrude_25_tool3.solids().sort_by_distance((5.871131, 0, 0.326096))[0])

    # 草图38 → 凸台-拉伸26 (add)
    with BuildSketch(Plane(origin=(52.5, 0, 0), x_dir=(0, 0, -1), z_dir=(1, 0, 0))):
        with Locations((-39.5, 4.5)):
            Rectangle(SKETCH_38_W, SKETCH_38_H)
    extrude(amount=EXTRUDE_26_DEPTH)

    # 草图39 → 凸台-拉伸27 (add)
    with BuildSketch(Plane(origin=(55.25, 0, 0), x_dir=(0, 0, -1), z_dir=(1, 0, 0))):
        with BuildLine():
            Line((-41.5, 14), (-46.208867521, 14))
            ThreePointArc((-46.208867521, 14), (-54.024933862, 11.705542723), (-49.3, 5.07))
            Line((-49.3, 5.07), (-41.5, -5))
            Line((-41.5, -5), (-41.5, 14))
        make_face()
        with Locations((-49.3, 10.07)):
            Circle(SKETCH_39_R, mode=Mode.SUBTRACT)
    extrude(amount=-EXTRUDE_27_DEPTH)

    # 草图40 → 凸台-拉伸28 (add)
    with BuildSketch(Plane.XY.offset(41.5)):
        with Locations((48, 11.5)):
            Rectangle(SKETCH_40_W, SKETCH_40_H)
    extrude(amount=EXTRUDE_28_DEPTH)

    # 倒角3
    chamfer_3_edges = [part.edges().sort_by_distance(p)[0] for p in [
        (52.5, 4.5, 37.5),
    ]]
    chamfer(chamfer_3_edges, length=CHAMFER_3_SIZE - 0.0001)  # a hair under: the kernel refuses the full size

    # 切除-拉伸11: up to this plane
    cut_extrude_11_end = Plane(origin=(1.537514073, 14, 22.437673566), z_dir=(0, 0.9563047559630374, -0.29237170472273044))
    # 草图41 → 切除-拉伸11 (cut, up to the surface)
    with BuildSketch(Plane(origin=(0, 3, 0), x_dir=(1, 0, 0), z_dir=(0, 1, 0)), mode=Mode.PRIVATE) as cut_extrude_11_sk1:
        with Locations((0, 3.5)):
            Rectangle(SKETCH_41_W, SKETCH_41_H)
    cut_extrude_11_tool1 = split(extrude(cut_extrude_11_sk1.sketch, amount=CUT_EXTRUDE_11_REACH, mode=Mode.PRIVATE), bisect_by=cut_extrude_11_end, keep=Keep.BOTH, mode=Mode.PRIVATE)
    add(cut_extrude_11_tool1.solids().sort_by_distance((0, 3, -3.5))[0], mode=Mode.SUBTRACT)

    # 圆角2
    fillet_2_edges = [part.edges().sort_by_distance(p)[0] for p in [
        (45.5, 7.403874271, 0.862718454),
        (14, 7.403874271, 0.862718454),
    ]]
    fillet(fillet_2_edges, radius=FILLET_2_R)

    # 草图42 → 凸台-拉伸29 (add)
    with BuildSketch(Plane.XZ.offset(5).offset(EXTRUDE_START_2)):
        Polygon((49.5, 38), (51.5, 36), (51.5, 38), align=None)
    extrude(amount=EXTRUDE_29_DEPTH)

    # 草图43 → 凸台-拉伸30 (add)
    with BuildSketch(Plane(origin=(55.25, 0, 0), x_dir=(0, 0, -1), z_dir=(1, 0, 0))):
        with Locations((-39, 4.5)):
            Rectangle(SKETCH_43_W, SKETCH_43_H)
    extrude(amount=EXTRUDE_30_DEPTH)

    # 倒角4
    chamfer_4_edges = [part.edges().sort_by_distance(p)[0] for p in [
        (56.75, 4.5, 37.5),
    ]]
    chamfer(chamfer_4_edges, length=CHAMFER_4_SIZE)

    # 草图45 → 凸台-拉伸31 (add)
    with BuildSketch(Plane.ZY.offset(9.5)):
        Polygon((0, 3.765711135), (21.356409098, 0), (0, 0), align=None)
    extrude(amount=EXTRUDE_31_DEPTH)

    # 圆角3
    # the kernel refuses this fillet: 2 mm, written as the material it takes off along each edge
    with BuildSketch(Plane(origin=(0.199805375, 5, -7), x_dir=(0, 0.29237170472273, 0.9563047559630375), z_dir=(-1, 0, 0))) as fillet_3_piece_1:
        with BuildLine():
            CenterArc((FILLET_3_R * 0.739961075028, -FILLET_3_R), FILLET_3_R, 90, 73)
            Line((-FILLET_3_R * 0.216343680935, -FILLET_3_R * 0.707628295277), (0, 0))
            Line((0, 0), (FILLET_3_R * 0.739961075028, 0))
        make_face()
    extrude(amount=13.39961075, mode=Mode.SUBTRACT)
    with BuildSketch(Plane(origin=(56.199805375, 5, -7), x_dir=(0, 0.29237170472273, 0.9563047559630375), z_dir=(-1, 0, 0))) as fillet_3_piece_2:
        with BuildLine():
            CenterArc((FILLET_3_R * 0.739961075028, -FILLET_3_R), FILLET_3_R, 90, 73)
            Line((-FILLET_3_R * 0.216343680935, -FILLET_3_R * 0.707628295277), (0, 0))
            Line((0, 0), (FILLET_3_R * 0.739961075028, 0))
        make_face()
    extrude(amount=56.39961075, mode=Mode.SUBTRACT)

    # 草图46 → 切除-拉伸12 (cut)
    with BuildSketch(Plane.XY.offset(41.5)):
        Polygon((53.25, 9), (42.75, 9), (42.75, 5.5), (49.5, 5.5), (49.5, -5), (53.25, -5), align=None)
    extrude(amount=-CUT_EXTRUDE_12_DEPTH, mode=Mode.SUBTRACT)

    # 草图47 → 凸台-拉伸32 (add, two sides: drawn at the far end of the back side and taken through both)
    with BuildSketch(Plane.XZ.offset(5).offset(-EXTRUDE_32_DEPTH_BACK)):
        with Locations((53.6, 14.975)):
            Rectangle(SKETCH_47_W, SKETCH_47_H)
    extrude(amount=EXTRUDE_32_DEPTH + EXTRUDE_32_DEPTH_BACK)

    # 倒角5
    chamfer_5_edges = [part.edges().sort_by_distance(p)[0] for p in [
        (54.7, -2, 14.975),
    ]]
    chamfer(chamfer_5_edges, length=CHAMFER_5_SIZE)

    # 草图48 → 切除-拉伸13 (cut)
    with BuildSketch(Plane.XZ.offset(8)):
        with Locations((53.05, 15.725)):
            Rectangle(SKETCH_48_W, SKETCH_48_H)
    extrude(amount=-CUT_EXTRUDE_13_DEPTH, mode=Mode.SUBTRACT)

    # 草图49 → 凸台-拉伸33 (add)
    with BuildSketch(Plane.XZ.offset(5)):
        Polygon((53.6, 36.95), (55.65, 39), (55.65, 40.5), (56.75, 40.5), (56.75, 39), (54.7, 36.95), align=None)
    extrude(amount=EXTRUDE_33_DEPTH)

    # 草图50 → 切除-拉伸14 (cut)
    with BuildSketch(Plane.XZ.offset(8)):
        with Locations((55.95, 39.5)):
            Rectangle(SKETCH_50_W, SKETCH_50_H)
    extrude(amount=-CUT_EXTRUDE_14_DEPTH, mode=Mode.SUBTRACT)

    # 草图51 → 凸台-拉伸34 (add)
    with BuildSketch(Plane.XZ.offset(5)):
        Polygon((55.15, 38.5), (53.6, 36.95), (53.6, 38.5), align=None)
    extrude(amount=EXTRUDE_34_DEPTH)


solid = part.part
